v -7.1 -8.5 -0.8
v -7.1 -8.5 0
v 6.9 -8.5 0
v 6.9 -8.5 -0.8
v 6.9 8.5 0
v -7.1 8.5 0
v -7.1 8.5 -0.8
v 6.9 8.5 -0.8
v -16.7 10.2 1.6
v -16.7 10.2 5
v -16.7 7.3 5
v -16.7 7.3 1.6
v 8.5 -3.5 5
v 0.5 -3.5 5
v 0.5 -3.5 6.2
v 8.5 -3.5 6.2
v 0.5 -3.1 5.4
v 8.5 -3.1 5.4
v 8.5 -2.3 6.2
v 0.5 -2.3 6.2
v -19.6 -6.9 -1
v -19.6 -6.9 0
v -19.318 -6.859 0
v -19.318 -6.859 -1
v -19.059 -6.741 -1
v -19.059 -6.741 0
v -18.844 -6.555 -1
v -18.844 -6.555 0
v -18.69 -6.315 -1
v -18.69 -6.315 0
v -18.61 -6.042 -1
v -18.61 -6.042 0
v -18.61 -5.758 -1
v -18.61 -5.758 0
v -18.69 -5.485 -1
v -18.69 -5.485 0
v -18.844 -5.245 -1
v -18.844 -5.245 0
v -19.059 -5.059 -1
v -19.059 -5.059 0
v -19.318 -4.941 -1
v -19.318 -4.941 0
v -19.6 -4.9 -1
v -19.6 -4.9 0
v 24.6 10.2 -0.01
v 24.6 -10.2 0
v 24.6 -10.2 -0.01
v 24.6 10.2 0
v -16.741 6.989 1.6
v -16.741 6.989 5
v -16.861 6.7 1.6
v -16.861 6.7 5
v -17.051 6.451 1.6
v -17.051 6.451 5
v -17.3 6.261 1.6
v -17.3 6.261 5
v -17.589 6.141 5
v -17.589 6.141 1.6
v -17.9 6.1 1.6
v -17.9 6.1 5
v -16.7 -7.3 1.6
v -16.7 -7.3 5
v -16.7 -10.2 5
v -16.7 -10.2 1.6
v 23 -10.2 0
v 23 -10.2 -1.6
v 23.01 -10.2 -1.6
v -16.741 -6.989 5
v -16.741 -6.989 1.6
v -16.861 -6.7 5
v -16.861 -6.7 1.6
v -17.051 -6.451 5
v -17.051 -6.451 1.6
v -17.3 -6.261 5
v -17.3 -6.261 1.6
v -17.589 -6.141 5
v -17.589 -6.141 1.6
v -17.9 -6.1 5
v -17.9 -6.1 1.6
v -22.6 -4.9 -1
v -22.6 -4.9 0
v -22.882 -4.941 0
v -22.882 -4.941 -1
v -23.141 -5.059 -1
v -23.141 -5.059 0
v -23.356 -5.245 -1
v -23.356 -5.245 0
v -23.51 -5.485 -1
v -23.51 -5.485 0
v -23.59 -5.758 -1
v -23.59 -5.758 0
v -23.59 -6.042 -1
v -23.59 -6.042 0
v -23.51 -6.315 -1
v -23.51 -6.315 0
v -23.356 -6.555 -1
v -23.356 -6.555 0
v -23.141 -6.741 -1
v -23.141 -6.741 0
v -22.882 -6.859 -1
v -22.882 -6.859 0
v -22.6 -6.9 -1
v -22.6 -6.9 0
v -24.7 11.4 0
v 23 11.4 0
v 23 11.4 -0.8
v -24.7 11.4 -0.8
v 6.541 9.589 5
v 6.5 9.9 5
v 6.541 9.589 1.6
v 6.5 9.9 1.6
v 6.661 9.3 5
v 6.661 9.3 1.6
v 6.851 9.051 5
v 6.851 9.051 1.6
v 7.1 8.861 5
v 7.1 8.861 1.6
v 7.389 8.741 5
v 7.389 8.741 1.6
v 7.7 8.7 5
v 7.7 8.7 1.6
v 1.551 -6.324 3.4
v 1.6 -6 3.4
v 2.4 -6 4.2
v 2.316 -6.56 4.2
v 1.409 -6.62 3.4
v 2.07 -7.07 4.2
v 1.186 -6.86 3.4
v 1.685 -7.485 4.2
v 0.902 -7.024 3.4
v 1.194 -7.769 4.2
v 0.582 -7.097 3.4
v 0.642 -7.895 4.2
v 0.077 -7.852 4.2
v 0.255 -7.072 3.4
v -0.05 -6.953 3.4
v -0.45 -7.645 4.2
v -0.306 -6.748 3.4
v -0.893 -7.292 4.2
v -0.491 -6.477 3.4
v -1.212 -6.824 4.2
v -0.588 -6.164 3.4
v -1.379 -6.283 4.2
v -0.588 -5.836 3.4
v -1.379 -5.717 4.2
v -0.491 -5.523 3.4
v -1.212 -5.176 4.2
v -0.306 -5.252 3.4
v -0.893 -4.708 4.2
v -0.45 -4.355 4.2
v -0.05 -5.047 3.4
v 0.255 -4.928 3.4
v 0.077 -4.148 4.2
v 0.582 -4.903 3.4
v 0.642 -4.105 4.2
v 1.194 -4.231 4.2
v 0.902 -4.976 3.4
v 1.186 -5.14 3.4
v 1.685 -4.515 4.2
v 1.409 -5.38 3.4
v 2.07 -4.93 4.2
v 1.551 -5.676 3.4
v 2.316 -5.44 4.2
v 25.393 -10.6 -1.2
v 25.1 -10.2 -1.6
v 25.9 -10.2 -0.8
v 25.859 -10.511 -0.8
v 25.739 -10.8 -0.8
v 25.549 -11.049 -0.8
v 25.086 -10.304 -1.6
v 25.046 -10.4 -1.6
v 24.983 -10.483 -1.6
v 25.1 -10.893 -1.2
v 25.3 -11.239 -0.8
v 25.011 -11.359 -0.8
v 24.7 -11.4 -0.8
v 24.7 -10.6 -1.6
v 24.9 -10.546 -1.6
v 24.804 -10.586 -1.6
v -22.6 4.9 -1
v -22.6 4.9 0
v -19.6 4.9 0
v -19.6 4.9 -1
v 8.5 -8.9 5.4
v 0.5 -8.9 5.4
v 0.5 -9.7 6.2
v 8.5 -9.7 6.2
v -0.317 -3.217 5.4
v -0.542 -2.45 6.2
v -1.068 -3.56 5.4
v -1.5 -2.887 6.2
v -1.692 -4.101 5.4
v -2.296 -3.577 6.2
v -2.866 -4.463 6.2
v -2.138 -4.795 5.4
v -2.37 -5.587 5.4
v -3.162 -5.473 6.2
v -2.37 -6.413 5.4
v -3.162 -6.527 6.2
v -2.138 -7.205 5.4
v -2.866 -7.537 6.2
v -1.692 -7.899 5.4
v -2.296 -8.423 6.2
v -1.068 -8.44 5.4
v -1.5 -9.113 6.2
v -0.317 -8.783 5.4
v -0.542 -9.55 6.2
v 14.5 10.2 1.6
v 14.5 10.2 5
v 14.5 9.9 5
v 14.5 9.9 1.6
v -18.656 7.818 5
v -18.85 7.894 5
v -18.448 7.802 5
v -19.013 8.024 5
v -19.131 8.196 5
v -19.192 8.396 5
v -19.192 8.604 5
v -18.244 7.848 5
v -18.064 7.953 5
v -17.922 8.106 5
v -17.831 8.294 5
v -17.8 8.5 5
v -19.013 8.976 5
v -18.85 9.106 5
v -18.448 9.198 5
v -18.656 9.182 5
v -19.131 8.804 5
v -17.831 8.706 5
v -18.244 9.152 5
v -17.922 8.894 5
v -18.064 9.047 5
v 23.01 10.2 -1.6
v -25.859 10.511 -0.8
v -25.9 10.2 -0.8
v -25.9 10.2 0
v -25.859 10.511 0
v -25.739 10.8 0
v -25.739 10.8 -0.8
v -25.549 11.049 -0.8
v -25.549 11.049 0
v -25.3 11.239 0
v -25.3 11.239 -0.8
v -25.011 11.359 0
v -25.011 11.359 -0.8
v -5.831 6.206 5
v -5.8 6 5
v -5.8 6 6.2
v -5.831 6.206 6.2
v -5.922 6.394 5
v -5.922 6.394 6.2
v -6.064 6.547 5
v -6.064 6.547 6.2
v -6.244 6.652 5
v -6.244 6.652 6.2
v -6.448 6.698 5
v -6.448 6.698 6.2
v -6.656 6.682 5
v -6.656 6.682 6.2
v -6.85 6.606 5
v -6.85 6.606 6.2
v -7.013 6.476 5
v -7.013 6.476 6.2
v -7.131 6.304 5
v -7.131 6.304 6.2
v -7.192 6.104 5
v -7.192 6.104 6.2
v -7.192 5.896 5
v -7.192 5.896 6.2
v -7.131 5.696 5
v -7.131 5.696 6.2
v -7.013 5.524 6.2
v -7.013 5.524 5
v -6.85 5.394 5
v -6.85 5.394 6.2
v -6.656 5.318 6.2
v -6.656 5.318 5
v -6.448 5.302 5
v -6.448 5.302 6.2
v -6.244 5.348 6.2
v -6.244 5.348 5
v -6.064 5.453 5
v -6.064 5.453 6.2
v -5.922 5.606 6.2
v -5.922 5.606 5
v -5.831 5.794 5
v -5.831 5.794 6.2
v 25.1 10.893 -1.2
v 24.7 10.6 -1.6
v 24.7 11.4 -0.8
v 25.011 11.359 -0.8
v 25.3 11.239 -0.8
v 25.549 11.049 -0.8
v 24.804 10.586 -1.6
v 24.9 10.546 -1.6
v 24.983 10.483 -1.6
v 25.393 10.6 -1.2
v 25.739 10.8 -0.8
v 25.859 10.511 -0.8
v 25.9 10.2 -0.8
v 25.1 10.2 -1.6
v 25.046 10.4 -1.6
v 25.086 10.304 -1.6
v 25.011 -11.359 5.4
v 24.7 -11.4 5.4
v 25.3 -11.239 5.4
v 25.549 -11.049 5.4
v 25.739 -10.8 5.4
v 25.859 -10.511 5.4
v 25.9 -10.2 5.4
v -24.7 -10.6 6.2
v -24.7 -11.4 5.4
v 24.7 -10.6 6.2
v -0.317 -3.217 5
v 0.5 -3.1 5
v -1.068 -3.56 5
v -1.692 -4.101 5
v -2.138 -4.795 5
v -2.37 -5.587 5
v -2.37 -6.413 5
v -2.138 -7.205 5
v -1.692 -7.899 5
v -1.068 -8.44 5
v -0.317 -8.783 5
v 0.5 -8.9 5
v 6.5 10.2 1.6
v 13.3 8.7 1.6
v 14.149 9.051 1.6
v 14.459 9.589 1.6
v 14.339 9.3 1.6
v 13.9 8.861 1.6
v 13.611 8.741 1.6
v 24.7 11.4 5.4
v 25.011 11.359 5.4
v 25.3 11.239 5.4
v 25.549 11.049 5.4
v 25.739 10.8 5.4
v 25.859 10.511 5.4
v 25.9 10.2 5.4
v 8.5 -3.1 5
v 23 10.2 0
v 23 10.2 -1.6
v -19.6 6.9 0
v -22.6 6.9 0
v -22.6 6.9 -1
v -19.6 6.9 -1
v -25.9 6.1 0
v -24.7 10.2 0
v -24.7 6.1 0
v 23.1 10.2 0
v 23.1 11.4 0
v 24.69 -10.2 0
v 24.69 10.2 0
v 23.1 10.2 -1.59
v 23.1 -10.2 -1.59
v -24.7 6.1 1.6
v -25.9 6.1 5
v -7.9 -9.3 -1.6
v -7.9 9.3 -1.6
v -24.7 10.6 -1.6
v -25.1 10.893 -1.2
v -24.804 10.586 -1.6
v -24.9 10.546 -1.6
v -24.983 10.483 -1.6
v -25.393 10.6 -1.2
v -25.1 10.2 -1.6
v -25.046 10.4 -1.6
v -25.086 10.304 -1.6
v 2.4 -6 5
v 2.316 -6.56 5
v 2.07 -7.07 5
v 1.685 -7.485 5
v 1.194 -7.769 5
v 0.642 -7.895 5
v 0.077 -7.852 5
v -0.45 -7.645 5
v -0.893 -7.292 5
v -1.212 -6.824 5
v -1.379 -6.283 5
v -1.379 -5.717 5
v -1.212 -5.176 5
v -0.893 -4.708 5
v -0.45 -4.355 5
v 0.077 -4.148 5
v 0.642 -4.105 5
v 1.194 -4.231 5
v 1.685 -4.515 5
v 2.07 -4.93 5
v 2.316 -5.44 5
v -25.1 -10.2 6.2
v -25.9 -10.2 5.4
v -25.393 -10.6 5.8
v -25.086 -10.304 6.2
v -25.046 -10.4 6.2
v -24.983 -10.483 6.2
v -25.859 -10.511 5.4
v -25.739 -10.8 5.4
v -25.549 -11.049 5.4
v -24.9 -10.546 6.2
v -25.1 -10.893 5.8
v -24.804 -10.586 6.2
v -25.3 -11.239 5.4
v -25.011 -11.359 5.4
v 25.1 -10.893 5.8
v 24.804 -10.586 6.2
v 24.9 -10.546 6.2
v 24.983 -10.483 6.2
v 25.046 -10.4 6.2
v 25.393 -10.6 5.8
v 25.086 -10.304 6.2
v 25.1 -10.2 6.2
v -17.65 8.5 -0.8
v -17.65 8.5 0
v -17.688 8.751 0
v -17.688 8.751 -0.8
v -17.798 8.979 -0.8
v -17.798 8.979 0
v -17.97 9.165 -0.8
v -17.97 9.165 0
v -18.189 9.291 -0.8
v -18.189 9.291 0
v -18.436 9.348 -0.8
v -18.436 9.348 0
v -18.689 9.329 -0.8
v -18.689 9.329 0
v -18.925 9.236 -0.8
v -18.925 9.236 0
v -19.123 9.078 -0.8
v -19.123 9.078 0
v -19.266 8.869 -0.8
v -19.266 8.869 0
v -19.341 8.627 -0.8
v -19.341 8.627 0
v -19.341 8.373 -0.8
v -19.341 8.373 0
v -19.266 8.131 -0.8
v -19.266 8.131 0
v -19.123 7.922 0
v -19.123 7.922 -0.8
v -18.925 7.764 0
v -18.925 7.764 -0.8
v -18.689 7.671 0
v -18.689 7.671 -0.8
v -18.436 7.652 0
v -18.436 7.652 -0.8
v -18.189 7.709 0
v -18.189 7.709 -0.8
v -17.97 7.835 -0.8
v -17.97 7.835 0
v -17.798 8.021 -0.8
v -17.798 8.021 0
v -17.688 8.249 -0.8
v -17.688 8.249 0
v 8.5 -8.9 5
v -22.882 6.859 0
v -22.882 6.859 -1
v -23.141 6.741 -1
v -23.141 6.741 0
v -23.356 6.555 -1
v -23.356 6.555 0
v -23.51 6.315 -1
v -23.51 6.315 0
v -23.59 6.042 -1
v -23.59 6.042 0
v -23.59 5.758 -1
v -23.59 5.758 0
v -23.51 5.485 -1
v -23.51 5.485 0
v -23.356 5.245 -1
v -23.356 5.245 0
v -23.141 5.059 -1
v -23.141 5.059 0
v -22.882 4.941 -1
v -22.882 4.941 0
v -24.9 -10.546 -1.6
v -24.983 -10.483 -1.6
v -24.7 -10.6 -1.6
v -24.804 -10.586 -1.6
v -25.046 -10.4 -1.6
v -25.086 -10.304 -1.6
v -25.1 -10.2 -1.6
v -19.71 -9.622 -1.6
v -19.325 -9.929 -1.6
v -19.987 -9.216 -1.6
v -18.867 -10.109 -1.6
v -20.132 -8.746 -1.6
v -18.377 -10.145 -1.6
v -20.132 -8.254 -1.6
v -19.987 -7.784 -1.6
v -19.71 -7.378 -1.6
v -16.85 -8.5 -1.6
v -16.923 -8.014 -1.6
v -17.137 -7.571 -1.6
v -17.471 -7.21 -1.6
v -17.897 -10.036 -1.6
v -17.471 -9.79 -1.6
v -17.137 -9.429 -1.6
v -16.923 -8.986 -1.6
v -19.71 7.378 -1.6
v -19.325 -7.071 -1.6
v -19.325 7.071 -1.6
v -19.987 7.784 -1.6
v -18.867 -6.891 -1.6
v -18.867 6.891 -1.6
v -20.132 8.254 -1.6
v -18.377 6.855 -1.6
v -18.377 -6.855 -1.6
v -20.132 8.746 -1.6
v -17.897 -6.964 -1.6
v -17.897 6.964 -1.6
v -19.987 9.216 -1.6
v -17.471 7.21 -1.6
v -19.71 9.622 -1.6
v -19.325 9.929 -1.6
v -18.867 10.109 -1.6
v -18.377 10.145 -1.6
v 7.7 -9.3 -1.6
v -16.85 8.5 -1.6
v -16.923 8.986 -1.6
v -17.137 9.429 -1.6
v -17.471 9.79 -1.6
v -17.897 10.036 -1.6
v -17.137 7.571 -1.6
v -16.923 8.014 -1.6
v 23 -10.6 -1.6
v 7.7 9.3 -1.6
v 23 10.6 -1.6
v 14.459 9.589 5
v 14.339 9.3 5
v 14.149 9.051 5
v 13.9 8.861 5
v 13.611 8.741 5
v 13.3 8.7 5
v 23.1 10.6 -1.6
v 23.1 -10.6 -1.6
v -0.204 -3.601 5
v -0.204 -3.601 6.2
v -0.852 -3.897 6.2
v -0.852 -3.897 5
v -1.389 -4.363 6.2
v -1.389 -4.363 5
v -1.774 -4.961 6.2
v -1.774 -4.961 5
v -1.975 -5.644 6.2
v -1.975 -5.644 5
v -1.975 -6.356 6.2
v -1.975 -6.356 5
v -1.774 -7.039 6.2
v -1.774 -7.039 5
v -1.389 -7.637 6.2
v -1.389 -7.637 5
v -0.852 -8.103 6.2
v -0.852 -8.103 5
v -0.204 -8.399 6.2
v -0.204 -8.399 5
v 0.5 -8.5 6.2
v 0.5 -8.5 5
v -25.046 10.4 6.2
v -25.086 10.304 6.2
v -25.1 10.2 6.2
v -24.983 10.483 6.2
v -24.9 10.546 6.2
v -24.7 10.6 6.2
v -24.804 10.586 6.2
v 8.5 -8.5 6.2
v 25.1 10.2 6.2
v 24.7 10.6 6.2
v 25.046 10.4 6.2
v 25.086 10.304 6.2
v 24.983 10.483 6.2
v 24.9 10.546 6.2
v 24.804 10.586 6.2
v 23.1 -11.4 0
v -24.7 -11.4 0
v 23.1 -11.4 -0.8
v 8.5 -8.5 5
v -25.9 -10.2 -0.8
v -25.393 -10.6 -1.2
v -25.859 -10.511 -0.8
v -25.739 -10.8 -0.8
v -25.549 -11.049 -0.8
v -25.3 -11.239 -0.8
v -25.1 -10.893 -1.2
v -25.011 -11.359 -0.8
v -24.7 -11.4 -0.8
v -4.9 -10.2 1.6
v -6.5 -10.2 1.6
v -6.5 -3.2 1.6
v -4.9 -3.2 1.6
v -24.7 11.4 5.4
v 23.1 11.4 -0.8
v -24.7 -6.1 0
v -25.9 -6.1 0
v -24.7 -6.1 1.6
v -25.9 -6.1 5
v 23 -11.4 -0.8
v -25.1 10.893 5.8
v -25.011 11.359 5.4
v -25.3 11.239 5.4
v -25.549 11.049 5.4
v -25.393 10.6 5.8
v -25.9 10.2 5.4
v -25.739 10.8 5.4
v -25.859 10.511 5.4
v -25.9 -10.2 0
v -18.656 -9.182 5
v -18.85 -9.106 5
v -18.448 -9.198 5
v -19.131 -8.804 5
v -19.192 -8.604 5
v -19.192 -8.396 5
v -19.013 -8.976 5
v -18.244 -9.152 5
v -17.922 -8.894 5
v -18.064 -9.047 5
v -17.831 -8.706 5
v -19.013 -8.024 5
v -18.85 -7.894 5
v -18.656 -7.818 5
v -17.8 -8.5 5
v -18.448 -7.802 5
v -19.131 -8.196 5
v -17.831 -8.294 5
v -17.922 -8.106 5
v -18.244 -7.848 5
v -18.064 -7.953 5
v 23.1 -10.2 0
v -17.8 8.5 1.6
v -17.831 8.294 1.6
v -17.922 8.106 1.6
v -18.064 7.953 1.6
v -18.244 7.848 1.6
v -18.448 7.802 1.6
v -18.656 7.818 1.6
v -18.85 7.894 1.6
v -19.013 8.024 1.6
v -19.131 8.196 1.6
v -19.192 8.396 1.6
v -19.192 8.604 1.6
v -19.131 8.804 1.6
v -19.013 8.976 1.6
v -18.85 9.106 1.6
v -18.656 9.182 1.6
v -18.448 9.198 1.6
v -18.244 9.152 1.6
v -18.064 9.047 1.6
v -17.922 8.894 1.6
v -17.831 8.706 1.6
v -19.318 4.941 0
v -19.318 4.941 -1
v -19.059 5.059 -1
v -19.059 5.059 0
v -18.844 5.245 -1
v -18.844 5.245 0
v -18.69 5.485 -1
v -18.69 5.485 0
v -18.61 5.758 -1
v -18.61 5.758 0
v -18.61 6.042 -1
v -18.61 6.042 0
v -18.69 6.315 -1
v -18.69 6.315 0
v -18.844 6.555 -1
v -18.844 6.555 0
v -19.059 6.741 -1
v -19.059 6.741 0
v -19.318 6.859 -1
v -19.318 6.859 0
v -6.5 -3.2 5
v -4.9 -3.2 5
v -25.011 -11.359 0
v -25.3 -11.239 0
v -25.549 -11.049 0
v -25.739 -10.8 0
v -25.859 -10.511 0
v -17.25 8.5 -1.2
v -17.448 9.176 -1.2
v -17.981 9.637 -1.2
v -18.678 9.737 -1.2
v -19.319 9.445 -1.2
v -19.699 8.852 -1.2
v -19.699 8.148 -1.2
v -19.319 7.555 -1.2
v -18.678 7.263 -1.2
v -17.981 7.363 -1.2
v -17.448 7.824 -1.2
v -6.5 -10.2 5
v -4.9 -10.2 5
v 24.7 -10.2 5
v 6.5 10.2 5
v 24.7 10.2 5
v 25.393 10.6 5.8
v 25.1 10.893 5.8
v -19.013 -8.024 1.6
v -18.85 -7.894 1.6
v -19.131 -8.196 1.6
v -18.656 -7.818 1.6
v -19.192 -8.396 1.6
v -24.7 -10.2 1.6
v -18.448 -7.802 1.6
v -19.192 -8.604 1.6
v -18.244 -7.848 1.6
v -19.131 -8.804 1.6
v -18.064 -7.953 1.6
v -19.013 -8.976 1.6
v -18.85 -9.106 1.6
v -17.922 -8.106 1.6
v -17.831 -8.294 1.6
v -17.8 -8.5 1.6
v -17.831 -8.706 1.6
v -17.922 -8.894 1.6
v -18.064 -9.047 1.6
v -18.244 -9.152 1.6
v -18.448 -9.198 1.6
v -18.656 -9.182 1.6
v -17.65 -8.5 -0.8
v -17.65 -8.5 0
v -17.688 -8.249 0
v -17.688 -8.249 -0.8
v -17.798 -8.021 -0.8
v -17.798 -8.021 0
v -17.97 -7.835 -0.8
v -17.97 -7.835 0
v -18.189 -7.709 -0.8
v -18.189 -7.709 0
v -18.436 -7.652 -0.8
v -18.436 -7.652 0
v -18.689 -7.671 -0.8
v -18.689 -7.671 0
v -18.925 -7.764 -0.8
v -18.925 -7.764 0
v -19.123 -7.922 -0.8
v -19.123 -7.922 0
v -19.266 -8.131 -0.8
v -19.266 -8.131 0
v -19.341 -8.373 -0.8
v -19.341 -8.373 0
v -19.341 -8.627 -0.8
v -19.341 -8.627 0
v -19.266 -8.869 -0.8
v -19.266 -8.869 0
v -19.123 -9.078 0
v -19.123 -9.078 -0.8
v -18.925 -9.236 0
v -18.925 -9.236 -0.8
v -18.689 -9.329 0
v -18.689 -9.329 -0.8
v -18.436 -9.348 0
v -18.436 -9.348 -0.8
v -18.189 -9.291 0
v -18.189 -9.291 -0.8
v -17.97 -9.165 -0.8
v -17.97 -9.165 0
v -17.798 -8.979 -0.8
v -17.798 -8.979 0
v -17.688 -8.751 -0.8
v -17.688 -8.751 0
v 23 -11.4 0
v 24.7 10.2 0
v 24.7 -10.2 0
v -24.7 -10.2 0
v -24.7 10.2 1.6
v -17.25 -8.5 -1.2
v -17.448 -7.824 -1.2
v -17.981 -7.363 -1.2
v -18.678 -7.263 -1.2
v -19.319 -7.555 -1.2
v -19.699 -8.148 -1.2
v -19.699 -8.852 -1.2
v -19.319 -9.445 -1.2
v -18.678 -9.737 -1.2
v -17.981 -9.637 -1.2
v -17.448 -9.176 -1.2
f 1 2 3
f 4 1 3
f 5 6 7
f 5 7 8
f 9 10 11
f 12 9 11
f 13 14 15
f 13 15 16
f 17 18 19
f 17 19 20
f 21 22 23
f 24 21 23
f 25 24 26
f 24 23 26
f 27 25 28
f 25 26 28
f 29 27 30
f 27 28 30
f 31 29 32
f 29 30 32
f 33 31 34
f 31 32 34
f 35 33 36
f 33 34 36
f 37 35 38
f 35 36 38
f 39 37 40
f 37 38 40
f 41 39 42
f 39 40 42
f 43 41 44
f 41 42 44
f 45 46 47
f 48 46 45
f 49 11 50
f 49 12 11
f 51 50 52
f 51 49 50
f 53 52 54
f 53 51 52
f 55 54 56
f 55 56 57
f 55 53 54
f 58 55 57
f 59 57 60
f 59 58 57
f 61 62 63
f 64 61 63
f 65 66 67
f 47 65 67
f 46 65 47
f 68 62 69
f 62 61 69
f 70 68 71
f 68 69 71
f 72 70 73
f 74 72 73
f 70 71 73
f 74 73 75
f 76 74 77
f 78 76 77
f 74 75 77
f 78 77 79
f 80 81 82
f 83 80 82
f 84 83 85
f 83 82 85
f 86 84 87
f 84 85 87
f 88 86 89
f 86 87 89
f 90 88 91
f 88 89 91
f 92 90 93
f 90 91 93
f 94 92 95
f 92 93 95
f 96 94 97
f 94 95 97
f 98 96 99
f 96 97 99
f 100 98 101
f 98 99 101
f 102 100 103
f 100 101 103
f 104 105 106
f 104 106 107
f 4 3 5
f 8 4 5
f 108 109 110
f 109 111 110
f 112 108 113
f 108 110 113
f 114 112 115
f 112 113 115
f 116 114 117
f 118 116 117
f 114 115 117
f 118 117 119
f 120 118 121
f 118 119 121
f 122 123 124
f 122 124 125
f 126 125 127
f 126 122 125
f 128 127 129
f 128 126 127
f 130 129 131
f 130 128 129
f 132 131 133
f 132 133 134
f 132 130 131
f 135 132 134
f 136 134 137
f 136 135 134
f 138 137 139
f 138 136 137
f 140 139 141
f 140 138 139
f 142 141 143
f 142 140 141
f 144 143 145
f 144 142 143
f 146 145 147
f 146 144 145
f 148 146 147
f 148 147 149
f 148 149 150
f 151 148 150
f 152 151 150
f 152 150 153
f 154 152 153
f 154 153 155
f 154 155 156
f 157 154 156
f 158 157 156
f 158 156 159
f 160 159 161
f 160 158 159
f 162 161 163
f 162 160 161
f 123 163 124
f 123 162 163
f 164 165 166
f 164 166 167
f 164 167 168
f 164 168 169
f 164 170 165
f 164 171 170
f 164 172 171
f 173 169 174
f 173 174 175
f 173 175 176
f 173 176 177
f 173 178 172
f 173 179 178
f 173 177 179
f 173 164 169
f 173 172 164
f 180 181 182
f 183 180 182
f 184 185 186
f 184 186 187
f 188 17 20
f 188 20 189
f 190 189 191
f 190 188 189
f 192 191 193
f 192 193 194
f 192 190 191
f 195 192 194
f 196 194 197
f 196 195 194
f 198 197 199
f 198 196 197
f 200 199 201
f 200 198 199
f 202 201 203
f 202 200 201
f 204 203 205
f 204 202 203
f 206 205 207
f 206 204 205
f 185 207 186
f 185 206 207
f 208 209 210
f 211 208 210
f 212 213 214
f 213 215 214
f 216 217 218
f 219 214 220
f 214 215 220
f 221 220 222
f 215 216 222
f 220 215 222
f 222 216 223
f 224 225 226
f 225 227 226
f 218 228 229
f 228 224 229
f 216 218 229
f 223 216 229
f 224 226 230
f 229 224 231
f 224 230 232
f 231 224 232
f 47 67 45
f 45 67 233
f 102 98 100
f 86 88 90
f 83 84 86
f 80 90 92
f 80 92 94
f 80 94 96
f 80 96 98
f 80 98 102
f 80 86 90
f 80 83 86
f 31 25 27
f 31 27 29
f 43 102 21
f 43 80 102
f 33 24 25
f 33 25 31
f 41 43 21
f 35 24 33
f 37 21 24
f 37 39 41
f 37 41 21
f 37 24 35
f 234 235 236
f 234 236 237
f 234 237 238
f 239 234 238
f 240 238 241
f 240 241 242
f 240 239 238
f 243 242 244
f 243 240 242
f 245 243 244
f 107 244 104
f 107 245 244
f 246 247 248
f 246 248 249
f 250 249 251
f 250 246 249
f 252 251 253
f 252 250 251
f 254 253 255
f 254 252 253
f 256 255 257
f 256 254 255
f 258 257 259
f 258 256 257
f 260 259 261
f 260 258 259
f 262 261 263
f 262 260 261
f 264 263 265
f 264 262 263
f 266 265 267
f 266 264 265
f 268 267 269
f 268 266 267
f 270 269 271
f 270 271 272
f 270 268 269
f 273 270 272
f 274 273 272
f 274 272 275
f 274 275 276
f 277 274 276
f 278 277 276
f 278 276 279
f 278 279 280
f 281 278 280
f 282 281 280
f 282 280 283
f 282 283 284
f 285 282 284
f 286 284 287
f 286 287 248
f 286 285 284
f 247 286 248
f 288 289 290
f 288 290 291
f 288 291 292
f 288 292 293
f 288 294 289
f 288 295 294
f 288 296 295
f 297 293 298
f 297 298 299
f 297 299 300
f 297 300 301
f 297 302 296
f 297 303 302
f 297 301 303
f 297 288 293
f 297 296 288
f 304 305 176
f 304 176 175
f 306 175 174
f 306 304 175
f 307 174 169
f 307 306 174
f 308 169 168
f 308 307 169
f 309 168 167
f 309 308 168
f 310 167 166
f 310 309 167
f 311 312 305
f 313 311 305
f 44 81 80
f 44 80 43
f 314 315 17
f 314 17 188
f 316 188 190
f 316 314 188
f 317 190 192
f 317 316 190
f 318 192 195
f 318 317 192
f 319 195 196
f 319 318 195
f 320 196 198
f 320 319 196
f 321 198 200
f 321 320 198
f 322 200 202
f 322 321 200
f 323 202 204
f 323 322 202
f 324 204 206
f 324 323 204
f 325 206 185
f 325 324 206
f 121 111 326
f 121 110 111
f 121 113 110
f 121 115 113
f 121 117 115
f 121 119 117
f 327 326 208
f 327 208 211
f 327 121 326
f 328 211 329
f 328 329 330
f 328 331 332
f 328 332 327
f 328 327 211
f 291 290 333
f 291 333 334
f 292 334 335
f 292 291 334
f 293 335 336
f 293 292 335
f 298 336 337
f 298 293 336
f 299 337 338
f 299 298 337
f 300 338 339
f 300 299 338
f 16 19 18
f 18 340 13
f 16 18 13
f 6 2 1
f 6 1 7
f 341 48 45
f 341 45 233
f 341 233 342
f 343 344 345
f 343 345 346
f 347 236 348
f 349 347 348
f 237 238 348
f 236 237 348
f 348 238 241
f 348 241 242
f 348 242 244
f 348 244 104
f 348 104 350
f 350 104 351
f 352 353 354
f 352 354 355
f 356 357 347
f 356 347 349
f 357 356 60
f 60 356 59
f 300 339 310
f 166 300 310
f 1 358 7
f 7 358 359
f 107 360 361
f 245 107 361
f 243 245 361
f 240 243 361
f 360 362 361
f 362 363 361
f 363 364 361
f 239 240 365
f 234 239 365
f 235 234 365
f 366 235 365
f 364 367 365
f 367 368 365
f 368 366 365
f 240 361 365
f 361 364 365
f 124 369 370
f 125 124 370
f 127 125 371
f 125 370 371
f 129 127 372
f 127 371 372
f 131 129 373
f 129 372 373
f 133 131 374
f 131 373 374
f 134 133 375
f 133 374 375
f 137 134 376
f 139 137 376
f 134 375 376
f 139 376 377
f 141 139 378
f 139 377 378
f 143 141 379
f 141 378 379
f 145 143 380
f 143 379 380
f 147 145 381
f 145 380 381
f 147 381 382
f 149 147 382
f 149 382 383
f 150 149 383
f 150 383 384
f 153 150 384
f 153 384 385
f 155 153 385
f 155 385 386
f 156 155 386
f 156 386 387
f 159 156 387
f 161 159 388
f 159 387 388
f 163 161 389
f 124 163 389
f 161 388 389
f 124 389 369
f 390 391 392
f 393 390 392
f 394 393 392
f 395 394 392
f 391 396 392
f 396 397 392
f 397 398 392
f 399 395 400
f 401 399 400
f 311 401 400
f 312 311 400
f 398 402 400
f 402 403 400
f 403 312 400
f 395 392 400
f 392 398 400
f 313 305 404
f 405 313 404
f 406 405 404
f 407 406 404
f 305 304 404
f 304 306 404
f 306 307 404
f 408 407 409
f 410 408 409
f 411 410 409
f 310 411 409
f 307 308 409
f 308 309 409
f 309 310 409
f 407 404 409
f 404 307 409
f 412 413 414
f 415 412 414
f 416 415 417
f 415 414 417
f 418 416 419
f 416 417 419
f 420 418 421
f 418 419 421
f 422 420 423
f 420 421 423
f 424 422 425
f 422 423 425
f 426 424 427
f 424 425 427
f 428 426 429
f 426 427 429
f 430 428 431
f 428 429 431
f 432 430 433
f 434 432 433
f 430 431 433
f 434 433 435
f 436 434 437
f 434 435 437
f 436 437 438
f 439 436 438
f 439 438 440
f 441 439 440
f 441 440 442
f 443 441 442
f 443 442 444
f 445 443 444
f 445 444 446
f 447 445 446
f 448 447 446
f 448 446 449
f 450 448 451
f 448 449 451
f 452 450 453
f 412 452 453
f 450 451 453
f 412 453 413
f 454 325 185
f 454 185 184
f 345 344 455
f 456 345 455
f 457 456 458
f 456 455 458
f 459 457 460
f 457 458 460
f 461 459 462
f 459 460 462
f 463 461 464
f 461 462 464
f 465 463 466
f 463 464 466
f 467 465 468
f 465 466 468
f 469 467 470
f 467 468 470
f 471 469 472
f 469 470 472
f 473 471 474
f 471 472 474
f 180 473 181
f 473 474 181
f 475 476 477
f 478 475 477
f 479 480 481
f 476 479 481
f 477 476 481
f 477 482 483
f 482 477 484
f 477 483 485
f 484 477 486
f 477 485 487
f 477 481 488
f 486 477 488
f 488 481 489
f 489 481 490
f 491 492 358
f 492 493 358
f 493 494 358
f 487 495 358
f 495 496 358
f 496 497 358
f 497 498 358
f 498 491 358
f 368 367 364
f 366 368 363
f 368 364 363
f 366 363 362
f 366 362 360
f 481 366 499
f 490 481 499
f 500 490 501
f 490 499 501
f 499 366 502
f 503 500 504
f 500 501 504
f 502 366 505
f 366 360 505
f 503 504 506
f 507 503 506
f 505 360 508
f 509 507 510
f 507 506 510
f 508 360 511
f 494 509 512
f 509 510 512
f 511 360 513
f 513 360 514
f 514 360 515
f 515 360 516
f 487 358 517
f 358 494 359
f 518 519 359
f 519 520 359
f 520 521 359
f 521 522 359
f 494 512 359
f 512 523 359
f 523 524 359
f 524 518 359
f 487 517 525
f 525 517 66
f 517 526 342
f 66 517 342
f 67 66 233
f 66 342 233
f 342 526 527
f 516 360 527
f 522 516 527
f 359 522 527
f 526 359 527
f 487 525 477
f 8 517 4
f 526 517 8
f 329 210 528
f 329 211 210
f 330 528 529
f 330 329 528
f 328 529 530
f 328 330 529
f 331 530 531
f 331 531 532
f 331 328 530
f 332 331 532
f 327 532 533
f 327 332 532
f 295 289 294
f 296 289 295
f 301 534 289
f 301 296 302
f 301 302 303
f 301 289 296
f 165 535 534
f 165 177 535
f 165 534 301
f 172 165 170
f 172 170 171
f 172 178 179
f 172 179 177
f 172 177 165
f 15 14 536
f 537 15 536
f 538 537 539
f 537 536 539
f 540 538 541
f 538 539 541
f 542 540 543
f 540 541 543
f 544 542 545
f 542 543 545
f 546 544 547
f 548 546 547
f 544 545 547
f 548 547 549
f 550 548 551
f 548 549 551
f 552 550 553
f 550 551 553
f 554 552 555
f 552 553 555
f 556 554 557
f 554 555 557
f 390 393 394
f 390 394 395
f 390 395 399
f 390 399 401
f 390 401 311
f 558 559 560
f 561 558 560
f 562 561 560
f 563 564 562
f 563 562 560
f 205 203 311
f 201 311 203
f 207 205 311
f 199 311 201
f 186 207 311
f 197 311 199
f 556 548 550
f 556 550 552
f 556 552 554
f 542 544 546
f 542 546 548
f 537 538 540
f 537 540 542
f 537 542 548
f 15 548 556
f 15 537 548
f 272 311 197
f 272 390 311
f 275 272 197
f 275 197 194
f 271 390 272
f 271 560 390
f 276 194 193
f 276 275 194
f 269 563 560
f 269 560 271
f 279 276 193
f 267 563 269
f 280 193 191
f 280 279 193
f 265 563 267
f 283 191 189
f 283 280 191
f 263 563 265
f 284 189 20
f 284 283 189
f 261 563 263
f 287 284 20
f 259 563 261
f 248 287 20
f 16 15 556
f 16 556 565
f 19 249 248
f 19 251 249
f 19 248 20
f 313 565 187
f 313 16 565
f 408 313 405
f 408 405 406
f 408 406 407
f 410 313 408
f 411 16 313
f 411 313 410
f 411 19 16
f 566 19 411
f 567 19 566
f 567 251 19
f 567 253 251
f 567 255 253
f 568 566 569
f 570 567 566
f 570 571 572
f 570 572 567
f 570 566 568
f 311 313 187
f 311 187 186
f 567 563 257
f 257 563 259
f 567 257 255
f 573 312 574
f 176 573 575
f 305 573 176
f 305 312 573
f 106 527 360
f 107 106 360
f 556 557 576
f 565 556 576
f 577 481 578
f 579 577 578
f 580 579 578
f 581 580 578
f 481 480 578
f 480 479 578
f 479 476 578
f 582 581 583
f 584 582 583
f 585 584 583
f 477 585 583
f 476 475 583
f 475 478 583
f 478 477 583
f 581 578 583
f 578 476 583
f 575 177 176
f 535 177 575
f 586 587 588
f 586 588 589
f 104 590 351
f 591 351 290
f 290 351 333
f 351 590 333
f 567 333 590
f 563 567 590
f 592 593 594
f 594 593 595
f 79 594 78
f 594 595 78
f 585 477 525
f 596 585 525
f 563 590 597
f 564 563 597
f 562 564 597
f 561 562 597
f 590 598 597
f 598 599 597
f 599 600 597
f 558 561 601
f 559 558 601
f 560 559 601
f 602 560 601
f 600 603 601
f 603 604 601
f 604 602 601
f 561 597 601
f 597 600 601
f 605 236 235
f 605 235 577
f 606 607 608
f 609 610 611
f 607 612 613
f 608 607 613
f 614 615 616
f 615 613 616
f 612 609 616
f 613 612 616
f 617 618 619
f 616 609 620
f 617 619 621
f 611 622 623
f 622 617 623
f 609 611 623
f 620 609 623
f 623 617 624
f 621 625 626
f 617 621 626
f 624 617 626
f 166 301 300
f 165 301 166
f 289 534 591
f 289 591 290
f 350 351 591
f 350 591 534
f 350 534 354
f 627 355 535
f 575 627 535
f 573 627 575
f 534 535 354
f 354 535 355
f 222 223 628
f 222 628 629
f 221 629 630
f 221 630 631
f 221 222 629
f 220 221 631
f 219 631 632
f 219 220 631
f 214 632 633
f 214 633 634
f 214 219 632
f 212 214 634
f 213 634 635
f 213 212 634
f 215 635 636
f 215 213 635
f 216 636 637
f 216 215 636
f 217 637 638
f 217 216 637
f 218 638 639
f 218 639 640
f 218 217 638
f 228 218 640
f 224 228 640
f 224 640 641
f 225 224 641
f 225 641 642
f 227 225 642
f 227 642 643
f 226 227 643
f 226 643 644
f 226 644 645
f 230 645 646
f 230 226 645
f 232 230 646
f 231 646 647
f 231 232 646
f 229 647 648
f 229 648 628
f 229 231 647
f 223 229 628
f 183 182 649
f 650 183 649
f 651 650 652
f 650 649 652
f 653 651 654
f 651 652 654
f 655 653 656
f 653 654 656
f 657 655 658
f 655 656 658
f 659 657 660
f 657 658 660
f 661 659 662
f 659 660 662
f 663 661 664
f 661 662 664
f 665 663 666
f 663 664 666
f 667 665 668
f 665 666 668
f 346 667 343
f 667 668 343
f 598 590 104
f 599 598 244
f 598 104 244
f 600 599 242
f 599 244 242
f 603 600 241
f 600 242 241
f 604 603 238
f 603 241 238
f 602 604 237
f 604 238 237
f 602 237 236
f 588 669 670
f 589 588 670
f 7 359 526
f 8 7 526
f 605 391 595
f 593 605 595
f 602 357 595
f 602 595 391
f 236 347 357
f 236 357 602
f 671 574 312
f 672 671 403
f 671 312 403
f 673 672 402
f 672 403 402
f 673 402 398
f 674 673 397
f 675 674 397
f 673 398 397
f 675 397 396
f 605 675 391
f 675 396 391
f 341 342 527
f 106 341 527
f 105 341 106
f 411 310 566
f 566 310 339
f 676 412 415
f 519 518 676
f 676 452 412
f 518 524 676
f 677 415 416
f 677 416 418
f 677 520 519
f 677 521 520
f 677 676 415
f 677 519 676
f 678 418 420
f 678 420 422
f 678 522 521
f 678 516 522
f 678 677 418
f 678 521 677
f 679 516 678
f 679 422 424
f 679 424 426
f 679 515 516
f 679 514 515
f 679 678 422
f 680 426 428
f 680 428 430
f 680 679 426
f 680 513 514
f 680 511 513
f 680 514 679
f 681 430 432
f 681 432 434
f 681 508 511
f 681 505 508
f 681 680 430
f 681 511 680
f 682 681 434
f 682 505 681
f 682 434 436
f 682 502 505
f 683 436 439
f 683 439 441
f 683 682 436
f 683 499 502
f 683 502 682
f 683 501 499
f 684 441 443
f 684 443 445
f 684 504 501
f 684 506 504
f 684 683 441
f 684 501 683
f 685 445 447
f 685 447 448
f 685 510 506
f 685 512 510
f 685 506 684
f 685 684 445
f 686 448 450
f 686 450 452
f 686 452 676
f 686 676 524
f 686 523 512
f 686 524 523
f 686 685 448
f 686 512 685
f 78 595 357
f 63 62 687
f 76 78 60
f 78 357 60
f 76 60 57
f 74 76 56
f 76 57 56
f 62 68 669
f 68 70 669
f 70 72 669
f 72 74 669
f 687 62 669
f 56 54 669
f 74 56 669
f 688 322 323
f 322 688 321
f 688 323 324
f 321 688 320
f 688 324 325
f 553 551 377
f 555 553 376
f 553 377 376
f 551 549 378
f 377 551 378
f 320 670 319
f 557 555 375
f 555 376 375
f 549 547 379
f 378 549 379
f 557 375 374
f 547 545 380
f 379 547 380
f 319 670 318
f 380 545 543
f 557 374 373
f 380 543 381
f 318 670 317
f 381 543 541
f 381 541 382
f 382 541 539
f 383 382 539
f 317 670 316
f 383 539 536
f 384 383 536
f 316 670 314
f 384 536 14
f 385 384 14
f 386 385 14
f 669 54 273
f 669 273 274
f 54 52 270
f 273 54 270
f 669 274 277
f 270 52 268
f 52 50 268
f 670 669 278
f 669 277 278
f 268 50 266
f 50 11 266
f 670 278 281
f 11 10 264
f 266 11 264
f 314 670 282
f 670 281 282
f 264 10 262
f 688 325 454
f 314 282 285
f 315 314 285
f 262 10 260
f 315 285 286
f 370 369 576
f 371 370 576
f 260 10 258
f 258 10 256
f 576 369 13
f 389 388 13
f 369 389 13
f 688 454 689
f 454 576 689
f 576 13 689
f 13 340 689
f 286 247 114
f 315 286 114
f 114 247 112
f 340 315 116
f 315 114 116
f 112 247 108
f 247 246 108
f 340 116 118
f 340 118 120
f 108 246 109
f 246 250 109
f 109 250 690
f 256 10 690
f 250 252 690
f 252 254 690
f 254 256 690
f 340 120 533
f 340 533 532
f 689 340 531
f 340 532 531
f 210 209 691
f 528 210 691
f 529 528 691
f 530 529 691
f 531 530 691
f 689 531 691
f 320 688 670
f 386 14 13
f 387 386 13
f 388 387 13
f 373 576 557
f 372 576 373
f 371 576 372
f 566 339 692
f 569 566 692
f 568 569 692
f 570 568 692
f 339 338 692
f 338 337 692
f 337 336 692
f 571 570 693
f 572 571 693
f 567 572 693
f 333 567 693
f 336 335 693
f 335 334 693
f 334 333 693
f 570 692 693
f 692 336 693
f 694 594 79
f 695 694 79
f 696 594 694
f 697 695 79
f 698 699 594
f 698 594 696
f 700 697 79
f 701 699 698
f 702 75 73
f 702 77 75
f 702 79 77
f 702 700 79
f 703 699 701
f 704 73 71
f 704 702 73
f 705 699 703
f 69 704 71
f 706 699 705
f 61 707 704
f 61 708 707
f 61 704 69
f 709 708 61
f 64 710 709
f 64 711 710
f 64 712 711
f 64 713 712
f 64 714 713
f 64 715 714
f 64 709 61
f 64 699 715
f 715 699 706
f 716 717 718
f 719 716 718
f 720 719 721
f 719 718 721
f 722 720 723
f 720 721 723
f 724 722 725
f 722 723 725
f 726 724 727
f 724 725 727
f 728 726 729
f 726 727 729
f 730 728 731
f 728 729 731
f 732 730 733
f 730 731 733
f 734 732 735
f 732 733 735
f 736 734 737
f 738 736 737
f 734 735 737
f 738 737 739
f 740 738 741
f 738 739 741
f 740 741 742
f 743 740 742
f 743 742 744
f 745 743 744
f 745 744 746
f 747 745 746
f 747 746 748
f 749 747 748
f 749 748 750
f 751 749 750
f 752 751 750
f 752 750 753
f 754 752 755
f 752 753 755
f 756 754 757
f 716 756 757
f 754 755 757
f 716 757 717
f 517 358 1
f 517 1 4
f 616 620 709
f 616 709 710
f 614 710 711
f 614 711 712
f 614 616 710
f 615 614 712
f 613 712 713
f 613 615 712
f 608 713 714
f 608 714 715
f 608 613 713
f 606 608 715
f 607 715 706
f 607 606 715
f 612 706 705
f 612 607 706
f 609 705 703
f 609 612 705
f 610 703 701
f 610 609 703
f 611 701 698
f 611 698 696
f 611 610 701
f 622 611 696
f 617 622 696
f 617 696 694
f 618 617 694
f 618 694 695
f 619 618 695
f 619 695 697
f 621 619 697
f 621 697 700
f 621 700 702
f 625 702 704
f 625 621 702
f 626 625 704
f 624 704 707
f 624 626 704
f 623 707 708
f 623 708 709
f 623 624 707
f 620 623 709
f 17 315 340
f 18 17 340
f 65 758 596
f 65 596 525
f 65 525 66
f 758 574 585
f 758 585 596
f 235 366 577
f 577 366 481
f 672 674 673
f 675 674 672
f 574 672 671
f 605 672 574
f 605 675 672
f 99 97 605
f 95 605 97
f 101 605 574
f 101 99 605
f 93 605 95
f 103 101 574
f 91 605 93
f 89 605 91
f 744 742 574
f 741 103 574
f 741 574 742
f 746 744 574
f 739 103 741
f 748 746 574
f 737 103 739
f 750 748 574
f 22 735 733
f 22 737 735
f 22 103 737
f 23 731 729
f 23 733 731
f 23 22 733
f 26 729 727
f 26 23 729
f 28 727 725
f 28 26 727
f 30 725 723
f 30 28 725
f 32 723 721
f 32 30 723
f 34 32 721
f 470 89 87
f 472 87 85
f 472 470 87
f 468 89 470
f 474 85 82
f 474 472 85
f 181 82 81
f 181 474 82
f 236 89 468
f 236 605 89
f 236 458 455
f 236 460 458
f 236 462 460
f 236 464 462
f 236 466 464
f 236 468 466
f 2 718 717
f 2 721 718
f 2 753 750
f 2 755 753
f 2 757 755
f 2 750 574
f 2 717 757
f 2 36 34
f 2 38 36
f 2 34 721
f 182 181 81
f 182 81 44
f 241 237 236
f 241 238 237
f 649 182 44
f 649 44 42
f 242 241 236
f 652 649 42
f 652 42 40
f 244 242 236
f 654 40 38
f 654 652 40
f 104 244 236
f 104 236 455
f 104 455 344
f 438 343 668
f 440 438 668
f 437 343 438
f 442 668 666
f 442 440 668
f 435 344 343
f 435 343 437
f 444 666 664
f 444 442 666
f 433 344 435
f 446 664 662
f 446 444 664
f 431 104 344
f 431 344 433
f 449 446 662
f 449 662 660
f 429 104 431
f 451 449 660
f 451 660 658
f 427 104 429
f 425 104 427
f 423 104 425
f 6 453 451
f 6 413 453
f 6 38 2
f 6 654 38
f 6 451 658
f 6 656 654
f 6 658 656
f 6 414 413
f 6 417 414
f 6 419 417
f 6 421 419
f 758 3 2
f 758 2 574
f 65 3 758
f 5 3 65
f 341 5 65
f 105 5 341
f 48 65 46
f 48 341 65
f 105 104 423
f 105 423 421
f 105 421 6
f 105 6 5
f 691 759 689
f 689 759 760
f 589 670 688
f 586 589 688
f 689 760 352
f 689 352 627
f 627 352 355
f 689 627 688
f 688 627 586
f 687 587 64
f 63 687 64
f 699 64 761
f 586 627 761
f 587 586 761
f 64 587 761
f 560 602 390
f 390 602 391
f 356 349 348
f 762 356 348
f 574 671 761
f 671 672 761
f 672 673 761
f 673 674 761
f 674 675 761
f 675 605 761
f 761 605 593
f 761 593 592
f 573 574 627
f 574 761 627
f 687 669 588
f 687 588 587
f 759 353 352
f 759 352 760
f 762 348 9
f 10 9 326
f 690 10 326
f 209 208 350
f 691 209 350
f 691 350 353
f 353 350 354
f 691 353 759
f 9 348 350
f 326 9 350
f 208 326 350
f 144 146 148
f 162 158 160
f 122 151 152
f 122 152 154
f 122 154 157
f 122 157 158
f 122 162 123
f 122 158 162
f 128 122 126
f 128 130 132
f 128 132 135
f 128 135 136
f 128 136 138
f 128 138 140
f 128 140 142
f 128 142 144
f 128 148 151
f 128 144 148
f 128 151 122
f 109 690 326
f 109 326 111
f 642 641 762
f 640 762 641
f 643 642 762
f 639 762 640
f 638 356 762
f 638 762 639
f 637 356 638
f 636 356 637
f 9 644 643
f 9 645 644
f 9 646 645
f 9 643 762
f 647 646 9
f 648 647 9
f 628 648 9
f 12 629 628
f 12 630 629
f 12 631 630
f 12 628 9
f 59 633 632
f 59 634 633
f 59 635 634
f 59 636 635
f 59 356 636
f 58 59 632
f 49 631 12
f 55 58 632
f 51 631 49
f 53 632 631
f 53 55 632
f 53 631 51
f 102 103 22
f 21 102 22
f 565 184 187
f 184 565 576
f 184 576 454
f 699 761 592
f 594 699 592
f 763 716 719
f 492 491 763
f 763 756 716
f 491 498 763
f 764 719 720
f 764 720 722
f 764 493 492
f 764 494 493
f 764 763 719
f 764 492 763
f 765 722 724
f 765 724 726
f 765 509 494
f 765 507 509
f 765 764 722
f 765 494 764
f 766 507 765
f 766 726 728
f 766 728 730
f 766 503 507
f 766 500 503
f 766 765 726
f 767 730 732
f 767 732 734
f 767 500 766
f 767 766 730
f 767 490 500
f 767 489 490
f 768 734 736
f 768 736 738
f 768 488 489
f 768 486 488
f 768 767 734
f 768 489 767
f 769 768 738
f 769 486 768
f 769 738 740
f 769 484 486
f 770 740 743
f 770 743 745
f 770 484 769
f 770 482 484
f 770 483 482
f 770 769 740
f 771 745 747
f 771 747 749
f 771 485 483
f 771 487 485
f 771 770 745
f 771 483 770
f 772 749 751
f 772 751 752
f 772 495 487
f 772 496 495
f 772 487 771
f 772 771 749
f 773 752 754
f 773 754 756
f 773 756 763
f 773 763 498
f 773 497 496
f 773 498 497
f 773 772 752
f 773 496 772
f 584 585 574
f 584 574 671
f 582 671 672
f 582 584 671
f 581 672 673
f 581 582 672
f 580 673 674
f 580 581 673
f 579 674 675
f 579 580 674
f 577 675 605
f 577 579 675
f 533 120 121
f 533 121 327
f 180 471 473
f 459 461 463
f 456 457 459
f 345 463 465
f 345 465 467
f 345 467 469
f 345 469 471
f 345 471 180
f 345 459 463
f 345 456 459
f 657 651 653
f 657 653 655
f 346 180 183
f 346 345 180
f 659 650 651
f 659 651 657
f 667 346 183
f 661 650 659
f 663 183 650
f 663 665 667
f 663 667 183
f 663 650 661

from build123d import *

# Parameters (mm, degrees)
PAD_DEPTH       = 5
SKETCH001_W     = 51.8
SKETCH001_H     = 22.8
SKETCH001_R     = 0.7
PAD001_DEPTH    = 1.2
SKETCH002_W     = 8
SKETCH002_H     = 4.1
SKETCH002_R     = 0.7
SKETCH002_H_2   = 1.5
SKETCH002_W_2   = 1.6
SKETCH002_H_3   = 7
PAD002_DEPTH    = 3.4
SKETCH003_R     = 1.9
PAD003_DEPTH    = 1.6
SKETCH004_W     = 2.8
SKETCH004_H     = 22.8
PAD004_DEPTH    = 1.6
CHAMFER_SIZE    = 1.59
FILLET001_R     = 1.2
CHAMFER003_SIZE = 0.8
SKETCH005_R     = 0.85
SKETCH005_W     = 14
SKETCH005_H     = 17
PAD005_DEPTH    = 1.6
CHAMFER001_SIZE = 1.59
POCKET_DEPTH    = 1
FILLET_R        = 1.2
CHAMFER004_SIZE = 0.8


with BuildPart() as hat:
    # Sketch → Pad (new body)
    with BuildSketch(Plane.XY):
        Polygon((-25.9, 6.1), (-24.7, 6.1), (-24.7, 10.2), (24.7, 10.2), (24.7, -10.2), (-24.7, -10.2), (-24.7, -6.1), (-25.9, -6.1), (-25.9, -11.4), (25.9, -11.4), (25.9, 11.4), (-25.9, 11.4), align=None)
    extrude(amount=PAD_DEPTH)

    # Sketch001 (on Face14 of Pad) → Pad001 (join)
    with BuildSketch(Plane.XY.offset(5)):
        Rectangle(SKETCH001_W, SKETCH001_H)
        with Locations((-6.5, 6)):
            Circle(SKETCH001_R, mode=Mode.SUBTRACT)
        with BuildLine():
            ThreePointArc((0.5, -3.5), (-2, -6), (0.5, -8.5))
            Line((0.5, -8.5), (8.5, -8.5))
            Line((8.5, -8.5), (8.5, -8.9))
            Line((0.5, -8.9), (8.5, -8.9))
            ThreePointArc((0.5, -3.1), (-2.4, -6), (0.5, -8.9))
            Line((0.5, -3.1), (8.5, -3.1))
            Line((8.5, -3.1), (8.5, -3.5))
            Line((0.5, -3.5), (8.5, -3.5))
        make_face(mode=Mode.SUBTRACT)
    extrude(amount=PAD001_DEPTH)

    # Sketch002 (on Face4 of Pad001) → Pad002 (join)
    with BuildSketch(Plane(origin=(0, 0, 5), x_dir=(1, 0, 0), z_dir=(0, 0, -1))):
        with Locations((-20.7, 8.15)):
            Rectangle(SKETCH002_W, SKETCH002_H)
        with Locations((-18.5, 8.5)):
            Circle(SKETCH002_R, mode=Mode.SUBTRACT)
        with Locations((-20.7, -8.15)):
            Rectangle(SKETCH002_W, SKETCH002_H)
        with Locations((-18.5, -8.5)):
            Circle(SKETCH002_R, mode=Mode.SUBTRACT)
        with Locations((10.5, -9.45)):
            Rectangle(SKETCH002_W, SKETCH002_H_2)
        with Locations((-5.7, 6.7)):
            Rectangle(SKETCH002_W_2, SKETCH002_H_3)
    extrude(amount=PAD002_DEPTH)

    # Sketch003 (on Face4 of Pad002) → Pad003 (join)
    with BuildSketch(Plane(origin=(0, 0, 5), x_dir=(1, 0, 0), z_dir=(0, 0, -1))):
        with Locations((0.5, 6)):
            Circle(SKETCH003_R)
    extrude(amount=PAD003_DEPTH)

    # Sketch004 (on Face2 of Pad003) → Pad004 (join)
    with BuildSketch(Plane(origin=(0, 0, 0), x_dir=(1, 0, 0), z_dir=(0, 0, -1))):
        with Locations((24.5, 0)):
            Rectangle(SKETCH004_W, SKETCH004_H)
    extrude(amount=PAD004_DEPTH)

    # Chamfer
    chamfer_edges = [hat.edges().sort_by_distance(p)[0] for p in [
        (23.1, 0, 0),
    ]]
    chamfer(chamfer_edges, length=CHAMFER_SIZE)

    # Fillet001
    fillet001_edges = [hat.edges().sort_by_distance(p)[0] for p in [
        (-25.9, 11.4, 3.1),
        (25.9, 11.4, 2.3),
        (25.9, -11.4, 2.3),
        (-25.9, -11.4, 3.1),
        (-16.7, -6.1, 3.3),
        (-16.7, 6.1, 3.3),
        (6.5, 8.7, 3.3),
        (14.5, 8.7, 3.3),
    ]]
    fillet(fillet001_edges, radius=FILLET001_R)

    # Chamfer003
    chamfer003_edges = [hat.edges().sort_by_distance(p)[0] for p in [
        (0, -11.4, 6.2),
        (-25.548528, -11.048528, 6.2),
        (-25.9, 0, 6.2),
        (-25.548528, 11.048528, 6.2),
        (0, 11.4, 6.2),
        (25.548528, 11.048528, 6.2),
        (25.9, 0, 6.2),
        (25.548528, -11.048528, 6.2),
        (4.5, -8.9, 6.2),
        (-2.4, -6, 6.2),
        (4.5, -3.1, 6.2),
        (23.9, 11.4, -1.6),
        (25.548528, 11.048528, -1.6),
        (25.9, 0, -1.6),
        (23.9, -11.4, -1.6),
        (25.548528, -11.048528, -1.6),
        (-1.4, -6, 3.4),
    ]]
    chamfer(chamfer003_edges, length=CHAMFER003_SIZE)


with BuildPart() as plate:
    # Sketch005 → Pad005 (new body)
    with BuildSketch(Plane.XY):
        Polygon((-25.9, -11.4), (23, -11.4), (23, -10.2), (24.6, -10.2), (24.6, 10.2), (23, 10.2), (23, 11.4), (-25.9, 11.4), align=None)
        with Locations((-18.5, 8.5)):
            Circle(SKETCH005_R, mode=Mode.SUBTRACT)
        with Locations((-18.5, -8.5)):
            Circle(SKETCH005_R, mode=Mode.SUBTRACT)
        with Locations((-0.1, 0)):
            Rectangle(SKETCH005_W, SKETCH005_H, mode=Mode.SUBTRACT)
    extrude(amount=-PAD005_DEPTH)

    # Chamfer001
    chamfer001_edges = [plate.edges().sort_by_distance(p)[0] for p in [
        (24.6, 0, -1.6),
    ]]
    chamfer(chamfer001_edges, length=CHAMFER001_SIZE)

    # Sketch006 (on Face4 of Chamfer001) → Pocket (cut)
    with BuildSketch(Plane.XY):
        with BuildLine():
            ThreePointArc((-22.6, 6.9), (-23.6, 5.9), (-22.6, 4.9))
            Line((-22.6, 4.9), (-19.6, 4.9))
            ThreePointArc((-19.6, 4.9), (-18.6, 5.9), (-19.6, 6.9))
            Line((-22.6, 6.9), (-19.6, 6.9))
        make_face()
        with BuildLine():
            ThreePointArc((-22.6, -4.9), (-23.6, -5.9), (-22.6, -6.9))
            Line((-22.6, -6.9), (-19.6, -6.9))
            ThreePointArc((-19.6, -6.9), (-18.6, -5.9), (-19.6, -4.9))
            Line((-22.6, -4.9), (-19.6, -4.9))
        make_face()
    extrude(amount=-POCKET_DEPTH, mode=Mode.SUBTRACT)

    # Fillet
    fillet_edges = [plate.edges().sort_by_distance(p)[0] for p in [
        (-25.9, -11.4, -0.8),
        (-25.9, 11.4, -0.8),
    ]]
    fillet(fillet_edges, radius=FILLET_R)

    # Chamfer004
    chamfer004_edges = [plate.edges().sort_by_distance(p)[0] for p in [
        (-0.85, -11.4, -1.6),
        (-25.9, 0, -1.6),
        (-25.548528, -11.048528, -1.6),
        (-25.548528, 11.048528, -1.6),
        (-0.85, 11.4, -1.6),
        (-0.1, 8.5, -1.6),
        (6.9, 0, -1.6),
        (-7.1, 0, -1.6),
        (-0.1, -8.5, -1.6),
        (-19.35, -8.5, -1.6),
        (-19.35, 8.5, -1.6),
    ]]
    chamfer(chamfer004_edges, length=CHAMFER004_SIZE)


solid = Compound([hat.part, plate.part])
